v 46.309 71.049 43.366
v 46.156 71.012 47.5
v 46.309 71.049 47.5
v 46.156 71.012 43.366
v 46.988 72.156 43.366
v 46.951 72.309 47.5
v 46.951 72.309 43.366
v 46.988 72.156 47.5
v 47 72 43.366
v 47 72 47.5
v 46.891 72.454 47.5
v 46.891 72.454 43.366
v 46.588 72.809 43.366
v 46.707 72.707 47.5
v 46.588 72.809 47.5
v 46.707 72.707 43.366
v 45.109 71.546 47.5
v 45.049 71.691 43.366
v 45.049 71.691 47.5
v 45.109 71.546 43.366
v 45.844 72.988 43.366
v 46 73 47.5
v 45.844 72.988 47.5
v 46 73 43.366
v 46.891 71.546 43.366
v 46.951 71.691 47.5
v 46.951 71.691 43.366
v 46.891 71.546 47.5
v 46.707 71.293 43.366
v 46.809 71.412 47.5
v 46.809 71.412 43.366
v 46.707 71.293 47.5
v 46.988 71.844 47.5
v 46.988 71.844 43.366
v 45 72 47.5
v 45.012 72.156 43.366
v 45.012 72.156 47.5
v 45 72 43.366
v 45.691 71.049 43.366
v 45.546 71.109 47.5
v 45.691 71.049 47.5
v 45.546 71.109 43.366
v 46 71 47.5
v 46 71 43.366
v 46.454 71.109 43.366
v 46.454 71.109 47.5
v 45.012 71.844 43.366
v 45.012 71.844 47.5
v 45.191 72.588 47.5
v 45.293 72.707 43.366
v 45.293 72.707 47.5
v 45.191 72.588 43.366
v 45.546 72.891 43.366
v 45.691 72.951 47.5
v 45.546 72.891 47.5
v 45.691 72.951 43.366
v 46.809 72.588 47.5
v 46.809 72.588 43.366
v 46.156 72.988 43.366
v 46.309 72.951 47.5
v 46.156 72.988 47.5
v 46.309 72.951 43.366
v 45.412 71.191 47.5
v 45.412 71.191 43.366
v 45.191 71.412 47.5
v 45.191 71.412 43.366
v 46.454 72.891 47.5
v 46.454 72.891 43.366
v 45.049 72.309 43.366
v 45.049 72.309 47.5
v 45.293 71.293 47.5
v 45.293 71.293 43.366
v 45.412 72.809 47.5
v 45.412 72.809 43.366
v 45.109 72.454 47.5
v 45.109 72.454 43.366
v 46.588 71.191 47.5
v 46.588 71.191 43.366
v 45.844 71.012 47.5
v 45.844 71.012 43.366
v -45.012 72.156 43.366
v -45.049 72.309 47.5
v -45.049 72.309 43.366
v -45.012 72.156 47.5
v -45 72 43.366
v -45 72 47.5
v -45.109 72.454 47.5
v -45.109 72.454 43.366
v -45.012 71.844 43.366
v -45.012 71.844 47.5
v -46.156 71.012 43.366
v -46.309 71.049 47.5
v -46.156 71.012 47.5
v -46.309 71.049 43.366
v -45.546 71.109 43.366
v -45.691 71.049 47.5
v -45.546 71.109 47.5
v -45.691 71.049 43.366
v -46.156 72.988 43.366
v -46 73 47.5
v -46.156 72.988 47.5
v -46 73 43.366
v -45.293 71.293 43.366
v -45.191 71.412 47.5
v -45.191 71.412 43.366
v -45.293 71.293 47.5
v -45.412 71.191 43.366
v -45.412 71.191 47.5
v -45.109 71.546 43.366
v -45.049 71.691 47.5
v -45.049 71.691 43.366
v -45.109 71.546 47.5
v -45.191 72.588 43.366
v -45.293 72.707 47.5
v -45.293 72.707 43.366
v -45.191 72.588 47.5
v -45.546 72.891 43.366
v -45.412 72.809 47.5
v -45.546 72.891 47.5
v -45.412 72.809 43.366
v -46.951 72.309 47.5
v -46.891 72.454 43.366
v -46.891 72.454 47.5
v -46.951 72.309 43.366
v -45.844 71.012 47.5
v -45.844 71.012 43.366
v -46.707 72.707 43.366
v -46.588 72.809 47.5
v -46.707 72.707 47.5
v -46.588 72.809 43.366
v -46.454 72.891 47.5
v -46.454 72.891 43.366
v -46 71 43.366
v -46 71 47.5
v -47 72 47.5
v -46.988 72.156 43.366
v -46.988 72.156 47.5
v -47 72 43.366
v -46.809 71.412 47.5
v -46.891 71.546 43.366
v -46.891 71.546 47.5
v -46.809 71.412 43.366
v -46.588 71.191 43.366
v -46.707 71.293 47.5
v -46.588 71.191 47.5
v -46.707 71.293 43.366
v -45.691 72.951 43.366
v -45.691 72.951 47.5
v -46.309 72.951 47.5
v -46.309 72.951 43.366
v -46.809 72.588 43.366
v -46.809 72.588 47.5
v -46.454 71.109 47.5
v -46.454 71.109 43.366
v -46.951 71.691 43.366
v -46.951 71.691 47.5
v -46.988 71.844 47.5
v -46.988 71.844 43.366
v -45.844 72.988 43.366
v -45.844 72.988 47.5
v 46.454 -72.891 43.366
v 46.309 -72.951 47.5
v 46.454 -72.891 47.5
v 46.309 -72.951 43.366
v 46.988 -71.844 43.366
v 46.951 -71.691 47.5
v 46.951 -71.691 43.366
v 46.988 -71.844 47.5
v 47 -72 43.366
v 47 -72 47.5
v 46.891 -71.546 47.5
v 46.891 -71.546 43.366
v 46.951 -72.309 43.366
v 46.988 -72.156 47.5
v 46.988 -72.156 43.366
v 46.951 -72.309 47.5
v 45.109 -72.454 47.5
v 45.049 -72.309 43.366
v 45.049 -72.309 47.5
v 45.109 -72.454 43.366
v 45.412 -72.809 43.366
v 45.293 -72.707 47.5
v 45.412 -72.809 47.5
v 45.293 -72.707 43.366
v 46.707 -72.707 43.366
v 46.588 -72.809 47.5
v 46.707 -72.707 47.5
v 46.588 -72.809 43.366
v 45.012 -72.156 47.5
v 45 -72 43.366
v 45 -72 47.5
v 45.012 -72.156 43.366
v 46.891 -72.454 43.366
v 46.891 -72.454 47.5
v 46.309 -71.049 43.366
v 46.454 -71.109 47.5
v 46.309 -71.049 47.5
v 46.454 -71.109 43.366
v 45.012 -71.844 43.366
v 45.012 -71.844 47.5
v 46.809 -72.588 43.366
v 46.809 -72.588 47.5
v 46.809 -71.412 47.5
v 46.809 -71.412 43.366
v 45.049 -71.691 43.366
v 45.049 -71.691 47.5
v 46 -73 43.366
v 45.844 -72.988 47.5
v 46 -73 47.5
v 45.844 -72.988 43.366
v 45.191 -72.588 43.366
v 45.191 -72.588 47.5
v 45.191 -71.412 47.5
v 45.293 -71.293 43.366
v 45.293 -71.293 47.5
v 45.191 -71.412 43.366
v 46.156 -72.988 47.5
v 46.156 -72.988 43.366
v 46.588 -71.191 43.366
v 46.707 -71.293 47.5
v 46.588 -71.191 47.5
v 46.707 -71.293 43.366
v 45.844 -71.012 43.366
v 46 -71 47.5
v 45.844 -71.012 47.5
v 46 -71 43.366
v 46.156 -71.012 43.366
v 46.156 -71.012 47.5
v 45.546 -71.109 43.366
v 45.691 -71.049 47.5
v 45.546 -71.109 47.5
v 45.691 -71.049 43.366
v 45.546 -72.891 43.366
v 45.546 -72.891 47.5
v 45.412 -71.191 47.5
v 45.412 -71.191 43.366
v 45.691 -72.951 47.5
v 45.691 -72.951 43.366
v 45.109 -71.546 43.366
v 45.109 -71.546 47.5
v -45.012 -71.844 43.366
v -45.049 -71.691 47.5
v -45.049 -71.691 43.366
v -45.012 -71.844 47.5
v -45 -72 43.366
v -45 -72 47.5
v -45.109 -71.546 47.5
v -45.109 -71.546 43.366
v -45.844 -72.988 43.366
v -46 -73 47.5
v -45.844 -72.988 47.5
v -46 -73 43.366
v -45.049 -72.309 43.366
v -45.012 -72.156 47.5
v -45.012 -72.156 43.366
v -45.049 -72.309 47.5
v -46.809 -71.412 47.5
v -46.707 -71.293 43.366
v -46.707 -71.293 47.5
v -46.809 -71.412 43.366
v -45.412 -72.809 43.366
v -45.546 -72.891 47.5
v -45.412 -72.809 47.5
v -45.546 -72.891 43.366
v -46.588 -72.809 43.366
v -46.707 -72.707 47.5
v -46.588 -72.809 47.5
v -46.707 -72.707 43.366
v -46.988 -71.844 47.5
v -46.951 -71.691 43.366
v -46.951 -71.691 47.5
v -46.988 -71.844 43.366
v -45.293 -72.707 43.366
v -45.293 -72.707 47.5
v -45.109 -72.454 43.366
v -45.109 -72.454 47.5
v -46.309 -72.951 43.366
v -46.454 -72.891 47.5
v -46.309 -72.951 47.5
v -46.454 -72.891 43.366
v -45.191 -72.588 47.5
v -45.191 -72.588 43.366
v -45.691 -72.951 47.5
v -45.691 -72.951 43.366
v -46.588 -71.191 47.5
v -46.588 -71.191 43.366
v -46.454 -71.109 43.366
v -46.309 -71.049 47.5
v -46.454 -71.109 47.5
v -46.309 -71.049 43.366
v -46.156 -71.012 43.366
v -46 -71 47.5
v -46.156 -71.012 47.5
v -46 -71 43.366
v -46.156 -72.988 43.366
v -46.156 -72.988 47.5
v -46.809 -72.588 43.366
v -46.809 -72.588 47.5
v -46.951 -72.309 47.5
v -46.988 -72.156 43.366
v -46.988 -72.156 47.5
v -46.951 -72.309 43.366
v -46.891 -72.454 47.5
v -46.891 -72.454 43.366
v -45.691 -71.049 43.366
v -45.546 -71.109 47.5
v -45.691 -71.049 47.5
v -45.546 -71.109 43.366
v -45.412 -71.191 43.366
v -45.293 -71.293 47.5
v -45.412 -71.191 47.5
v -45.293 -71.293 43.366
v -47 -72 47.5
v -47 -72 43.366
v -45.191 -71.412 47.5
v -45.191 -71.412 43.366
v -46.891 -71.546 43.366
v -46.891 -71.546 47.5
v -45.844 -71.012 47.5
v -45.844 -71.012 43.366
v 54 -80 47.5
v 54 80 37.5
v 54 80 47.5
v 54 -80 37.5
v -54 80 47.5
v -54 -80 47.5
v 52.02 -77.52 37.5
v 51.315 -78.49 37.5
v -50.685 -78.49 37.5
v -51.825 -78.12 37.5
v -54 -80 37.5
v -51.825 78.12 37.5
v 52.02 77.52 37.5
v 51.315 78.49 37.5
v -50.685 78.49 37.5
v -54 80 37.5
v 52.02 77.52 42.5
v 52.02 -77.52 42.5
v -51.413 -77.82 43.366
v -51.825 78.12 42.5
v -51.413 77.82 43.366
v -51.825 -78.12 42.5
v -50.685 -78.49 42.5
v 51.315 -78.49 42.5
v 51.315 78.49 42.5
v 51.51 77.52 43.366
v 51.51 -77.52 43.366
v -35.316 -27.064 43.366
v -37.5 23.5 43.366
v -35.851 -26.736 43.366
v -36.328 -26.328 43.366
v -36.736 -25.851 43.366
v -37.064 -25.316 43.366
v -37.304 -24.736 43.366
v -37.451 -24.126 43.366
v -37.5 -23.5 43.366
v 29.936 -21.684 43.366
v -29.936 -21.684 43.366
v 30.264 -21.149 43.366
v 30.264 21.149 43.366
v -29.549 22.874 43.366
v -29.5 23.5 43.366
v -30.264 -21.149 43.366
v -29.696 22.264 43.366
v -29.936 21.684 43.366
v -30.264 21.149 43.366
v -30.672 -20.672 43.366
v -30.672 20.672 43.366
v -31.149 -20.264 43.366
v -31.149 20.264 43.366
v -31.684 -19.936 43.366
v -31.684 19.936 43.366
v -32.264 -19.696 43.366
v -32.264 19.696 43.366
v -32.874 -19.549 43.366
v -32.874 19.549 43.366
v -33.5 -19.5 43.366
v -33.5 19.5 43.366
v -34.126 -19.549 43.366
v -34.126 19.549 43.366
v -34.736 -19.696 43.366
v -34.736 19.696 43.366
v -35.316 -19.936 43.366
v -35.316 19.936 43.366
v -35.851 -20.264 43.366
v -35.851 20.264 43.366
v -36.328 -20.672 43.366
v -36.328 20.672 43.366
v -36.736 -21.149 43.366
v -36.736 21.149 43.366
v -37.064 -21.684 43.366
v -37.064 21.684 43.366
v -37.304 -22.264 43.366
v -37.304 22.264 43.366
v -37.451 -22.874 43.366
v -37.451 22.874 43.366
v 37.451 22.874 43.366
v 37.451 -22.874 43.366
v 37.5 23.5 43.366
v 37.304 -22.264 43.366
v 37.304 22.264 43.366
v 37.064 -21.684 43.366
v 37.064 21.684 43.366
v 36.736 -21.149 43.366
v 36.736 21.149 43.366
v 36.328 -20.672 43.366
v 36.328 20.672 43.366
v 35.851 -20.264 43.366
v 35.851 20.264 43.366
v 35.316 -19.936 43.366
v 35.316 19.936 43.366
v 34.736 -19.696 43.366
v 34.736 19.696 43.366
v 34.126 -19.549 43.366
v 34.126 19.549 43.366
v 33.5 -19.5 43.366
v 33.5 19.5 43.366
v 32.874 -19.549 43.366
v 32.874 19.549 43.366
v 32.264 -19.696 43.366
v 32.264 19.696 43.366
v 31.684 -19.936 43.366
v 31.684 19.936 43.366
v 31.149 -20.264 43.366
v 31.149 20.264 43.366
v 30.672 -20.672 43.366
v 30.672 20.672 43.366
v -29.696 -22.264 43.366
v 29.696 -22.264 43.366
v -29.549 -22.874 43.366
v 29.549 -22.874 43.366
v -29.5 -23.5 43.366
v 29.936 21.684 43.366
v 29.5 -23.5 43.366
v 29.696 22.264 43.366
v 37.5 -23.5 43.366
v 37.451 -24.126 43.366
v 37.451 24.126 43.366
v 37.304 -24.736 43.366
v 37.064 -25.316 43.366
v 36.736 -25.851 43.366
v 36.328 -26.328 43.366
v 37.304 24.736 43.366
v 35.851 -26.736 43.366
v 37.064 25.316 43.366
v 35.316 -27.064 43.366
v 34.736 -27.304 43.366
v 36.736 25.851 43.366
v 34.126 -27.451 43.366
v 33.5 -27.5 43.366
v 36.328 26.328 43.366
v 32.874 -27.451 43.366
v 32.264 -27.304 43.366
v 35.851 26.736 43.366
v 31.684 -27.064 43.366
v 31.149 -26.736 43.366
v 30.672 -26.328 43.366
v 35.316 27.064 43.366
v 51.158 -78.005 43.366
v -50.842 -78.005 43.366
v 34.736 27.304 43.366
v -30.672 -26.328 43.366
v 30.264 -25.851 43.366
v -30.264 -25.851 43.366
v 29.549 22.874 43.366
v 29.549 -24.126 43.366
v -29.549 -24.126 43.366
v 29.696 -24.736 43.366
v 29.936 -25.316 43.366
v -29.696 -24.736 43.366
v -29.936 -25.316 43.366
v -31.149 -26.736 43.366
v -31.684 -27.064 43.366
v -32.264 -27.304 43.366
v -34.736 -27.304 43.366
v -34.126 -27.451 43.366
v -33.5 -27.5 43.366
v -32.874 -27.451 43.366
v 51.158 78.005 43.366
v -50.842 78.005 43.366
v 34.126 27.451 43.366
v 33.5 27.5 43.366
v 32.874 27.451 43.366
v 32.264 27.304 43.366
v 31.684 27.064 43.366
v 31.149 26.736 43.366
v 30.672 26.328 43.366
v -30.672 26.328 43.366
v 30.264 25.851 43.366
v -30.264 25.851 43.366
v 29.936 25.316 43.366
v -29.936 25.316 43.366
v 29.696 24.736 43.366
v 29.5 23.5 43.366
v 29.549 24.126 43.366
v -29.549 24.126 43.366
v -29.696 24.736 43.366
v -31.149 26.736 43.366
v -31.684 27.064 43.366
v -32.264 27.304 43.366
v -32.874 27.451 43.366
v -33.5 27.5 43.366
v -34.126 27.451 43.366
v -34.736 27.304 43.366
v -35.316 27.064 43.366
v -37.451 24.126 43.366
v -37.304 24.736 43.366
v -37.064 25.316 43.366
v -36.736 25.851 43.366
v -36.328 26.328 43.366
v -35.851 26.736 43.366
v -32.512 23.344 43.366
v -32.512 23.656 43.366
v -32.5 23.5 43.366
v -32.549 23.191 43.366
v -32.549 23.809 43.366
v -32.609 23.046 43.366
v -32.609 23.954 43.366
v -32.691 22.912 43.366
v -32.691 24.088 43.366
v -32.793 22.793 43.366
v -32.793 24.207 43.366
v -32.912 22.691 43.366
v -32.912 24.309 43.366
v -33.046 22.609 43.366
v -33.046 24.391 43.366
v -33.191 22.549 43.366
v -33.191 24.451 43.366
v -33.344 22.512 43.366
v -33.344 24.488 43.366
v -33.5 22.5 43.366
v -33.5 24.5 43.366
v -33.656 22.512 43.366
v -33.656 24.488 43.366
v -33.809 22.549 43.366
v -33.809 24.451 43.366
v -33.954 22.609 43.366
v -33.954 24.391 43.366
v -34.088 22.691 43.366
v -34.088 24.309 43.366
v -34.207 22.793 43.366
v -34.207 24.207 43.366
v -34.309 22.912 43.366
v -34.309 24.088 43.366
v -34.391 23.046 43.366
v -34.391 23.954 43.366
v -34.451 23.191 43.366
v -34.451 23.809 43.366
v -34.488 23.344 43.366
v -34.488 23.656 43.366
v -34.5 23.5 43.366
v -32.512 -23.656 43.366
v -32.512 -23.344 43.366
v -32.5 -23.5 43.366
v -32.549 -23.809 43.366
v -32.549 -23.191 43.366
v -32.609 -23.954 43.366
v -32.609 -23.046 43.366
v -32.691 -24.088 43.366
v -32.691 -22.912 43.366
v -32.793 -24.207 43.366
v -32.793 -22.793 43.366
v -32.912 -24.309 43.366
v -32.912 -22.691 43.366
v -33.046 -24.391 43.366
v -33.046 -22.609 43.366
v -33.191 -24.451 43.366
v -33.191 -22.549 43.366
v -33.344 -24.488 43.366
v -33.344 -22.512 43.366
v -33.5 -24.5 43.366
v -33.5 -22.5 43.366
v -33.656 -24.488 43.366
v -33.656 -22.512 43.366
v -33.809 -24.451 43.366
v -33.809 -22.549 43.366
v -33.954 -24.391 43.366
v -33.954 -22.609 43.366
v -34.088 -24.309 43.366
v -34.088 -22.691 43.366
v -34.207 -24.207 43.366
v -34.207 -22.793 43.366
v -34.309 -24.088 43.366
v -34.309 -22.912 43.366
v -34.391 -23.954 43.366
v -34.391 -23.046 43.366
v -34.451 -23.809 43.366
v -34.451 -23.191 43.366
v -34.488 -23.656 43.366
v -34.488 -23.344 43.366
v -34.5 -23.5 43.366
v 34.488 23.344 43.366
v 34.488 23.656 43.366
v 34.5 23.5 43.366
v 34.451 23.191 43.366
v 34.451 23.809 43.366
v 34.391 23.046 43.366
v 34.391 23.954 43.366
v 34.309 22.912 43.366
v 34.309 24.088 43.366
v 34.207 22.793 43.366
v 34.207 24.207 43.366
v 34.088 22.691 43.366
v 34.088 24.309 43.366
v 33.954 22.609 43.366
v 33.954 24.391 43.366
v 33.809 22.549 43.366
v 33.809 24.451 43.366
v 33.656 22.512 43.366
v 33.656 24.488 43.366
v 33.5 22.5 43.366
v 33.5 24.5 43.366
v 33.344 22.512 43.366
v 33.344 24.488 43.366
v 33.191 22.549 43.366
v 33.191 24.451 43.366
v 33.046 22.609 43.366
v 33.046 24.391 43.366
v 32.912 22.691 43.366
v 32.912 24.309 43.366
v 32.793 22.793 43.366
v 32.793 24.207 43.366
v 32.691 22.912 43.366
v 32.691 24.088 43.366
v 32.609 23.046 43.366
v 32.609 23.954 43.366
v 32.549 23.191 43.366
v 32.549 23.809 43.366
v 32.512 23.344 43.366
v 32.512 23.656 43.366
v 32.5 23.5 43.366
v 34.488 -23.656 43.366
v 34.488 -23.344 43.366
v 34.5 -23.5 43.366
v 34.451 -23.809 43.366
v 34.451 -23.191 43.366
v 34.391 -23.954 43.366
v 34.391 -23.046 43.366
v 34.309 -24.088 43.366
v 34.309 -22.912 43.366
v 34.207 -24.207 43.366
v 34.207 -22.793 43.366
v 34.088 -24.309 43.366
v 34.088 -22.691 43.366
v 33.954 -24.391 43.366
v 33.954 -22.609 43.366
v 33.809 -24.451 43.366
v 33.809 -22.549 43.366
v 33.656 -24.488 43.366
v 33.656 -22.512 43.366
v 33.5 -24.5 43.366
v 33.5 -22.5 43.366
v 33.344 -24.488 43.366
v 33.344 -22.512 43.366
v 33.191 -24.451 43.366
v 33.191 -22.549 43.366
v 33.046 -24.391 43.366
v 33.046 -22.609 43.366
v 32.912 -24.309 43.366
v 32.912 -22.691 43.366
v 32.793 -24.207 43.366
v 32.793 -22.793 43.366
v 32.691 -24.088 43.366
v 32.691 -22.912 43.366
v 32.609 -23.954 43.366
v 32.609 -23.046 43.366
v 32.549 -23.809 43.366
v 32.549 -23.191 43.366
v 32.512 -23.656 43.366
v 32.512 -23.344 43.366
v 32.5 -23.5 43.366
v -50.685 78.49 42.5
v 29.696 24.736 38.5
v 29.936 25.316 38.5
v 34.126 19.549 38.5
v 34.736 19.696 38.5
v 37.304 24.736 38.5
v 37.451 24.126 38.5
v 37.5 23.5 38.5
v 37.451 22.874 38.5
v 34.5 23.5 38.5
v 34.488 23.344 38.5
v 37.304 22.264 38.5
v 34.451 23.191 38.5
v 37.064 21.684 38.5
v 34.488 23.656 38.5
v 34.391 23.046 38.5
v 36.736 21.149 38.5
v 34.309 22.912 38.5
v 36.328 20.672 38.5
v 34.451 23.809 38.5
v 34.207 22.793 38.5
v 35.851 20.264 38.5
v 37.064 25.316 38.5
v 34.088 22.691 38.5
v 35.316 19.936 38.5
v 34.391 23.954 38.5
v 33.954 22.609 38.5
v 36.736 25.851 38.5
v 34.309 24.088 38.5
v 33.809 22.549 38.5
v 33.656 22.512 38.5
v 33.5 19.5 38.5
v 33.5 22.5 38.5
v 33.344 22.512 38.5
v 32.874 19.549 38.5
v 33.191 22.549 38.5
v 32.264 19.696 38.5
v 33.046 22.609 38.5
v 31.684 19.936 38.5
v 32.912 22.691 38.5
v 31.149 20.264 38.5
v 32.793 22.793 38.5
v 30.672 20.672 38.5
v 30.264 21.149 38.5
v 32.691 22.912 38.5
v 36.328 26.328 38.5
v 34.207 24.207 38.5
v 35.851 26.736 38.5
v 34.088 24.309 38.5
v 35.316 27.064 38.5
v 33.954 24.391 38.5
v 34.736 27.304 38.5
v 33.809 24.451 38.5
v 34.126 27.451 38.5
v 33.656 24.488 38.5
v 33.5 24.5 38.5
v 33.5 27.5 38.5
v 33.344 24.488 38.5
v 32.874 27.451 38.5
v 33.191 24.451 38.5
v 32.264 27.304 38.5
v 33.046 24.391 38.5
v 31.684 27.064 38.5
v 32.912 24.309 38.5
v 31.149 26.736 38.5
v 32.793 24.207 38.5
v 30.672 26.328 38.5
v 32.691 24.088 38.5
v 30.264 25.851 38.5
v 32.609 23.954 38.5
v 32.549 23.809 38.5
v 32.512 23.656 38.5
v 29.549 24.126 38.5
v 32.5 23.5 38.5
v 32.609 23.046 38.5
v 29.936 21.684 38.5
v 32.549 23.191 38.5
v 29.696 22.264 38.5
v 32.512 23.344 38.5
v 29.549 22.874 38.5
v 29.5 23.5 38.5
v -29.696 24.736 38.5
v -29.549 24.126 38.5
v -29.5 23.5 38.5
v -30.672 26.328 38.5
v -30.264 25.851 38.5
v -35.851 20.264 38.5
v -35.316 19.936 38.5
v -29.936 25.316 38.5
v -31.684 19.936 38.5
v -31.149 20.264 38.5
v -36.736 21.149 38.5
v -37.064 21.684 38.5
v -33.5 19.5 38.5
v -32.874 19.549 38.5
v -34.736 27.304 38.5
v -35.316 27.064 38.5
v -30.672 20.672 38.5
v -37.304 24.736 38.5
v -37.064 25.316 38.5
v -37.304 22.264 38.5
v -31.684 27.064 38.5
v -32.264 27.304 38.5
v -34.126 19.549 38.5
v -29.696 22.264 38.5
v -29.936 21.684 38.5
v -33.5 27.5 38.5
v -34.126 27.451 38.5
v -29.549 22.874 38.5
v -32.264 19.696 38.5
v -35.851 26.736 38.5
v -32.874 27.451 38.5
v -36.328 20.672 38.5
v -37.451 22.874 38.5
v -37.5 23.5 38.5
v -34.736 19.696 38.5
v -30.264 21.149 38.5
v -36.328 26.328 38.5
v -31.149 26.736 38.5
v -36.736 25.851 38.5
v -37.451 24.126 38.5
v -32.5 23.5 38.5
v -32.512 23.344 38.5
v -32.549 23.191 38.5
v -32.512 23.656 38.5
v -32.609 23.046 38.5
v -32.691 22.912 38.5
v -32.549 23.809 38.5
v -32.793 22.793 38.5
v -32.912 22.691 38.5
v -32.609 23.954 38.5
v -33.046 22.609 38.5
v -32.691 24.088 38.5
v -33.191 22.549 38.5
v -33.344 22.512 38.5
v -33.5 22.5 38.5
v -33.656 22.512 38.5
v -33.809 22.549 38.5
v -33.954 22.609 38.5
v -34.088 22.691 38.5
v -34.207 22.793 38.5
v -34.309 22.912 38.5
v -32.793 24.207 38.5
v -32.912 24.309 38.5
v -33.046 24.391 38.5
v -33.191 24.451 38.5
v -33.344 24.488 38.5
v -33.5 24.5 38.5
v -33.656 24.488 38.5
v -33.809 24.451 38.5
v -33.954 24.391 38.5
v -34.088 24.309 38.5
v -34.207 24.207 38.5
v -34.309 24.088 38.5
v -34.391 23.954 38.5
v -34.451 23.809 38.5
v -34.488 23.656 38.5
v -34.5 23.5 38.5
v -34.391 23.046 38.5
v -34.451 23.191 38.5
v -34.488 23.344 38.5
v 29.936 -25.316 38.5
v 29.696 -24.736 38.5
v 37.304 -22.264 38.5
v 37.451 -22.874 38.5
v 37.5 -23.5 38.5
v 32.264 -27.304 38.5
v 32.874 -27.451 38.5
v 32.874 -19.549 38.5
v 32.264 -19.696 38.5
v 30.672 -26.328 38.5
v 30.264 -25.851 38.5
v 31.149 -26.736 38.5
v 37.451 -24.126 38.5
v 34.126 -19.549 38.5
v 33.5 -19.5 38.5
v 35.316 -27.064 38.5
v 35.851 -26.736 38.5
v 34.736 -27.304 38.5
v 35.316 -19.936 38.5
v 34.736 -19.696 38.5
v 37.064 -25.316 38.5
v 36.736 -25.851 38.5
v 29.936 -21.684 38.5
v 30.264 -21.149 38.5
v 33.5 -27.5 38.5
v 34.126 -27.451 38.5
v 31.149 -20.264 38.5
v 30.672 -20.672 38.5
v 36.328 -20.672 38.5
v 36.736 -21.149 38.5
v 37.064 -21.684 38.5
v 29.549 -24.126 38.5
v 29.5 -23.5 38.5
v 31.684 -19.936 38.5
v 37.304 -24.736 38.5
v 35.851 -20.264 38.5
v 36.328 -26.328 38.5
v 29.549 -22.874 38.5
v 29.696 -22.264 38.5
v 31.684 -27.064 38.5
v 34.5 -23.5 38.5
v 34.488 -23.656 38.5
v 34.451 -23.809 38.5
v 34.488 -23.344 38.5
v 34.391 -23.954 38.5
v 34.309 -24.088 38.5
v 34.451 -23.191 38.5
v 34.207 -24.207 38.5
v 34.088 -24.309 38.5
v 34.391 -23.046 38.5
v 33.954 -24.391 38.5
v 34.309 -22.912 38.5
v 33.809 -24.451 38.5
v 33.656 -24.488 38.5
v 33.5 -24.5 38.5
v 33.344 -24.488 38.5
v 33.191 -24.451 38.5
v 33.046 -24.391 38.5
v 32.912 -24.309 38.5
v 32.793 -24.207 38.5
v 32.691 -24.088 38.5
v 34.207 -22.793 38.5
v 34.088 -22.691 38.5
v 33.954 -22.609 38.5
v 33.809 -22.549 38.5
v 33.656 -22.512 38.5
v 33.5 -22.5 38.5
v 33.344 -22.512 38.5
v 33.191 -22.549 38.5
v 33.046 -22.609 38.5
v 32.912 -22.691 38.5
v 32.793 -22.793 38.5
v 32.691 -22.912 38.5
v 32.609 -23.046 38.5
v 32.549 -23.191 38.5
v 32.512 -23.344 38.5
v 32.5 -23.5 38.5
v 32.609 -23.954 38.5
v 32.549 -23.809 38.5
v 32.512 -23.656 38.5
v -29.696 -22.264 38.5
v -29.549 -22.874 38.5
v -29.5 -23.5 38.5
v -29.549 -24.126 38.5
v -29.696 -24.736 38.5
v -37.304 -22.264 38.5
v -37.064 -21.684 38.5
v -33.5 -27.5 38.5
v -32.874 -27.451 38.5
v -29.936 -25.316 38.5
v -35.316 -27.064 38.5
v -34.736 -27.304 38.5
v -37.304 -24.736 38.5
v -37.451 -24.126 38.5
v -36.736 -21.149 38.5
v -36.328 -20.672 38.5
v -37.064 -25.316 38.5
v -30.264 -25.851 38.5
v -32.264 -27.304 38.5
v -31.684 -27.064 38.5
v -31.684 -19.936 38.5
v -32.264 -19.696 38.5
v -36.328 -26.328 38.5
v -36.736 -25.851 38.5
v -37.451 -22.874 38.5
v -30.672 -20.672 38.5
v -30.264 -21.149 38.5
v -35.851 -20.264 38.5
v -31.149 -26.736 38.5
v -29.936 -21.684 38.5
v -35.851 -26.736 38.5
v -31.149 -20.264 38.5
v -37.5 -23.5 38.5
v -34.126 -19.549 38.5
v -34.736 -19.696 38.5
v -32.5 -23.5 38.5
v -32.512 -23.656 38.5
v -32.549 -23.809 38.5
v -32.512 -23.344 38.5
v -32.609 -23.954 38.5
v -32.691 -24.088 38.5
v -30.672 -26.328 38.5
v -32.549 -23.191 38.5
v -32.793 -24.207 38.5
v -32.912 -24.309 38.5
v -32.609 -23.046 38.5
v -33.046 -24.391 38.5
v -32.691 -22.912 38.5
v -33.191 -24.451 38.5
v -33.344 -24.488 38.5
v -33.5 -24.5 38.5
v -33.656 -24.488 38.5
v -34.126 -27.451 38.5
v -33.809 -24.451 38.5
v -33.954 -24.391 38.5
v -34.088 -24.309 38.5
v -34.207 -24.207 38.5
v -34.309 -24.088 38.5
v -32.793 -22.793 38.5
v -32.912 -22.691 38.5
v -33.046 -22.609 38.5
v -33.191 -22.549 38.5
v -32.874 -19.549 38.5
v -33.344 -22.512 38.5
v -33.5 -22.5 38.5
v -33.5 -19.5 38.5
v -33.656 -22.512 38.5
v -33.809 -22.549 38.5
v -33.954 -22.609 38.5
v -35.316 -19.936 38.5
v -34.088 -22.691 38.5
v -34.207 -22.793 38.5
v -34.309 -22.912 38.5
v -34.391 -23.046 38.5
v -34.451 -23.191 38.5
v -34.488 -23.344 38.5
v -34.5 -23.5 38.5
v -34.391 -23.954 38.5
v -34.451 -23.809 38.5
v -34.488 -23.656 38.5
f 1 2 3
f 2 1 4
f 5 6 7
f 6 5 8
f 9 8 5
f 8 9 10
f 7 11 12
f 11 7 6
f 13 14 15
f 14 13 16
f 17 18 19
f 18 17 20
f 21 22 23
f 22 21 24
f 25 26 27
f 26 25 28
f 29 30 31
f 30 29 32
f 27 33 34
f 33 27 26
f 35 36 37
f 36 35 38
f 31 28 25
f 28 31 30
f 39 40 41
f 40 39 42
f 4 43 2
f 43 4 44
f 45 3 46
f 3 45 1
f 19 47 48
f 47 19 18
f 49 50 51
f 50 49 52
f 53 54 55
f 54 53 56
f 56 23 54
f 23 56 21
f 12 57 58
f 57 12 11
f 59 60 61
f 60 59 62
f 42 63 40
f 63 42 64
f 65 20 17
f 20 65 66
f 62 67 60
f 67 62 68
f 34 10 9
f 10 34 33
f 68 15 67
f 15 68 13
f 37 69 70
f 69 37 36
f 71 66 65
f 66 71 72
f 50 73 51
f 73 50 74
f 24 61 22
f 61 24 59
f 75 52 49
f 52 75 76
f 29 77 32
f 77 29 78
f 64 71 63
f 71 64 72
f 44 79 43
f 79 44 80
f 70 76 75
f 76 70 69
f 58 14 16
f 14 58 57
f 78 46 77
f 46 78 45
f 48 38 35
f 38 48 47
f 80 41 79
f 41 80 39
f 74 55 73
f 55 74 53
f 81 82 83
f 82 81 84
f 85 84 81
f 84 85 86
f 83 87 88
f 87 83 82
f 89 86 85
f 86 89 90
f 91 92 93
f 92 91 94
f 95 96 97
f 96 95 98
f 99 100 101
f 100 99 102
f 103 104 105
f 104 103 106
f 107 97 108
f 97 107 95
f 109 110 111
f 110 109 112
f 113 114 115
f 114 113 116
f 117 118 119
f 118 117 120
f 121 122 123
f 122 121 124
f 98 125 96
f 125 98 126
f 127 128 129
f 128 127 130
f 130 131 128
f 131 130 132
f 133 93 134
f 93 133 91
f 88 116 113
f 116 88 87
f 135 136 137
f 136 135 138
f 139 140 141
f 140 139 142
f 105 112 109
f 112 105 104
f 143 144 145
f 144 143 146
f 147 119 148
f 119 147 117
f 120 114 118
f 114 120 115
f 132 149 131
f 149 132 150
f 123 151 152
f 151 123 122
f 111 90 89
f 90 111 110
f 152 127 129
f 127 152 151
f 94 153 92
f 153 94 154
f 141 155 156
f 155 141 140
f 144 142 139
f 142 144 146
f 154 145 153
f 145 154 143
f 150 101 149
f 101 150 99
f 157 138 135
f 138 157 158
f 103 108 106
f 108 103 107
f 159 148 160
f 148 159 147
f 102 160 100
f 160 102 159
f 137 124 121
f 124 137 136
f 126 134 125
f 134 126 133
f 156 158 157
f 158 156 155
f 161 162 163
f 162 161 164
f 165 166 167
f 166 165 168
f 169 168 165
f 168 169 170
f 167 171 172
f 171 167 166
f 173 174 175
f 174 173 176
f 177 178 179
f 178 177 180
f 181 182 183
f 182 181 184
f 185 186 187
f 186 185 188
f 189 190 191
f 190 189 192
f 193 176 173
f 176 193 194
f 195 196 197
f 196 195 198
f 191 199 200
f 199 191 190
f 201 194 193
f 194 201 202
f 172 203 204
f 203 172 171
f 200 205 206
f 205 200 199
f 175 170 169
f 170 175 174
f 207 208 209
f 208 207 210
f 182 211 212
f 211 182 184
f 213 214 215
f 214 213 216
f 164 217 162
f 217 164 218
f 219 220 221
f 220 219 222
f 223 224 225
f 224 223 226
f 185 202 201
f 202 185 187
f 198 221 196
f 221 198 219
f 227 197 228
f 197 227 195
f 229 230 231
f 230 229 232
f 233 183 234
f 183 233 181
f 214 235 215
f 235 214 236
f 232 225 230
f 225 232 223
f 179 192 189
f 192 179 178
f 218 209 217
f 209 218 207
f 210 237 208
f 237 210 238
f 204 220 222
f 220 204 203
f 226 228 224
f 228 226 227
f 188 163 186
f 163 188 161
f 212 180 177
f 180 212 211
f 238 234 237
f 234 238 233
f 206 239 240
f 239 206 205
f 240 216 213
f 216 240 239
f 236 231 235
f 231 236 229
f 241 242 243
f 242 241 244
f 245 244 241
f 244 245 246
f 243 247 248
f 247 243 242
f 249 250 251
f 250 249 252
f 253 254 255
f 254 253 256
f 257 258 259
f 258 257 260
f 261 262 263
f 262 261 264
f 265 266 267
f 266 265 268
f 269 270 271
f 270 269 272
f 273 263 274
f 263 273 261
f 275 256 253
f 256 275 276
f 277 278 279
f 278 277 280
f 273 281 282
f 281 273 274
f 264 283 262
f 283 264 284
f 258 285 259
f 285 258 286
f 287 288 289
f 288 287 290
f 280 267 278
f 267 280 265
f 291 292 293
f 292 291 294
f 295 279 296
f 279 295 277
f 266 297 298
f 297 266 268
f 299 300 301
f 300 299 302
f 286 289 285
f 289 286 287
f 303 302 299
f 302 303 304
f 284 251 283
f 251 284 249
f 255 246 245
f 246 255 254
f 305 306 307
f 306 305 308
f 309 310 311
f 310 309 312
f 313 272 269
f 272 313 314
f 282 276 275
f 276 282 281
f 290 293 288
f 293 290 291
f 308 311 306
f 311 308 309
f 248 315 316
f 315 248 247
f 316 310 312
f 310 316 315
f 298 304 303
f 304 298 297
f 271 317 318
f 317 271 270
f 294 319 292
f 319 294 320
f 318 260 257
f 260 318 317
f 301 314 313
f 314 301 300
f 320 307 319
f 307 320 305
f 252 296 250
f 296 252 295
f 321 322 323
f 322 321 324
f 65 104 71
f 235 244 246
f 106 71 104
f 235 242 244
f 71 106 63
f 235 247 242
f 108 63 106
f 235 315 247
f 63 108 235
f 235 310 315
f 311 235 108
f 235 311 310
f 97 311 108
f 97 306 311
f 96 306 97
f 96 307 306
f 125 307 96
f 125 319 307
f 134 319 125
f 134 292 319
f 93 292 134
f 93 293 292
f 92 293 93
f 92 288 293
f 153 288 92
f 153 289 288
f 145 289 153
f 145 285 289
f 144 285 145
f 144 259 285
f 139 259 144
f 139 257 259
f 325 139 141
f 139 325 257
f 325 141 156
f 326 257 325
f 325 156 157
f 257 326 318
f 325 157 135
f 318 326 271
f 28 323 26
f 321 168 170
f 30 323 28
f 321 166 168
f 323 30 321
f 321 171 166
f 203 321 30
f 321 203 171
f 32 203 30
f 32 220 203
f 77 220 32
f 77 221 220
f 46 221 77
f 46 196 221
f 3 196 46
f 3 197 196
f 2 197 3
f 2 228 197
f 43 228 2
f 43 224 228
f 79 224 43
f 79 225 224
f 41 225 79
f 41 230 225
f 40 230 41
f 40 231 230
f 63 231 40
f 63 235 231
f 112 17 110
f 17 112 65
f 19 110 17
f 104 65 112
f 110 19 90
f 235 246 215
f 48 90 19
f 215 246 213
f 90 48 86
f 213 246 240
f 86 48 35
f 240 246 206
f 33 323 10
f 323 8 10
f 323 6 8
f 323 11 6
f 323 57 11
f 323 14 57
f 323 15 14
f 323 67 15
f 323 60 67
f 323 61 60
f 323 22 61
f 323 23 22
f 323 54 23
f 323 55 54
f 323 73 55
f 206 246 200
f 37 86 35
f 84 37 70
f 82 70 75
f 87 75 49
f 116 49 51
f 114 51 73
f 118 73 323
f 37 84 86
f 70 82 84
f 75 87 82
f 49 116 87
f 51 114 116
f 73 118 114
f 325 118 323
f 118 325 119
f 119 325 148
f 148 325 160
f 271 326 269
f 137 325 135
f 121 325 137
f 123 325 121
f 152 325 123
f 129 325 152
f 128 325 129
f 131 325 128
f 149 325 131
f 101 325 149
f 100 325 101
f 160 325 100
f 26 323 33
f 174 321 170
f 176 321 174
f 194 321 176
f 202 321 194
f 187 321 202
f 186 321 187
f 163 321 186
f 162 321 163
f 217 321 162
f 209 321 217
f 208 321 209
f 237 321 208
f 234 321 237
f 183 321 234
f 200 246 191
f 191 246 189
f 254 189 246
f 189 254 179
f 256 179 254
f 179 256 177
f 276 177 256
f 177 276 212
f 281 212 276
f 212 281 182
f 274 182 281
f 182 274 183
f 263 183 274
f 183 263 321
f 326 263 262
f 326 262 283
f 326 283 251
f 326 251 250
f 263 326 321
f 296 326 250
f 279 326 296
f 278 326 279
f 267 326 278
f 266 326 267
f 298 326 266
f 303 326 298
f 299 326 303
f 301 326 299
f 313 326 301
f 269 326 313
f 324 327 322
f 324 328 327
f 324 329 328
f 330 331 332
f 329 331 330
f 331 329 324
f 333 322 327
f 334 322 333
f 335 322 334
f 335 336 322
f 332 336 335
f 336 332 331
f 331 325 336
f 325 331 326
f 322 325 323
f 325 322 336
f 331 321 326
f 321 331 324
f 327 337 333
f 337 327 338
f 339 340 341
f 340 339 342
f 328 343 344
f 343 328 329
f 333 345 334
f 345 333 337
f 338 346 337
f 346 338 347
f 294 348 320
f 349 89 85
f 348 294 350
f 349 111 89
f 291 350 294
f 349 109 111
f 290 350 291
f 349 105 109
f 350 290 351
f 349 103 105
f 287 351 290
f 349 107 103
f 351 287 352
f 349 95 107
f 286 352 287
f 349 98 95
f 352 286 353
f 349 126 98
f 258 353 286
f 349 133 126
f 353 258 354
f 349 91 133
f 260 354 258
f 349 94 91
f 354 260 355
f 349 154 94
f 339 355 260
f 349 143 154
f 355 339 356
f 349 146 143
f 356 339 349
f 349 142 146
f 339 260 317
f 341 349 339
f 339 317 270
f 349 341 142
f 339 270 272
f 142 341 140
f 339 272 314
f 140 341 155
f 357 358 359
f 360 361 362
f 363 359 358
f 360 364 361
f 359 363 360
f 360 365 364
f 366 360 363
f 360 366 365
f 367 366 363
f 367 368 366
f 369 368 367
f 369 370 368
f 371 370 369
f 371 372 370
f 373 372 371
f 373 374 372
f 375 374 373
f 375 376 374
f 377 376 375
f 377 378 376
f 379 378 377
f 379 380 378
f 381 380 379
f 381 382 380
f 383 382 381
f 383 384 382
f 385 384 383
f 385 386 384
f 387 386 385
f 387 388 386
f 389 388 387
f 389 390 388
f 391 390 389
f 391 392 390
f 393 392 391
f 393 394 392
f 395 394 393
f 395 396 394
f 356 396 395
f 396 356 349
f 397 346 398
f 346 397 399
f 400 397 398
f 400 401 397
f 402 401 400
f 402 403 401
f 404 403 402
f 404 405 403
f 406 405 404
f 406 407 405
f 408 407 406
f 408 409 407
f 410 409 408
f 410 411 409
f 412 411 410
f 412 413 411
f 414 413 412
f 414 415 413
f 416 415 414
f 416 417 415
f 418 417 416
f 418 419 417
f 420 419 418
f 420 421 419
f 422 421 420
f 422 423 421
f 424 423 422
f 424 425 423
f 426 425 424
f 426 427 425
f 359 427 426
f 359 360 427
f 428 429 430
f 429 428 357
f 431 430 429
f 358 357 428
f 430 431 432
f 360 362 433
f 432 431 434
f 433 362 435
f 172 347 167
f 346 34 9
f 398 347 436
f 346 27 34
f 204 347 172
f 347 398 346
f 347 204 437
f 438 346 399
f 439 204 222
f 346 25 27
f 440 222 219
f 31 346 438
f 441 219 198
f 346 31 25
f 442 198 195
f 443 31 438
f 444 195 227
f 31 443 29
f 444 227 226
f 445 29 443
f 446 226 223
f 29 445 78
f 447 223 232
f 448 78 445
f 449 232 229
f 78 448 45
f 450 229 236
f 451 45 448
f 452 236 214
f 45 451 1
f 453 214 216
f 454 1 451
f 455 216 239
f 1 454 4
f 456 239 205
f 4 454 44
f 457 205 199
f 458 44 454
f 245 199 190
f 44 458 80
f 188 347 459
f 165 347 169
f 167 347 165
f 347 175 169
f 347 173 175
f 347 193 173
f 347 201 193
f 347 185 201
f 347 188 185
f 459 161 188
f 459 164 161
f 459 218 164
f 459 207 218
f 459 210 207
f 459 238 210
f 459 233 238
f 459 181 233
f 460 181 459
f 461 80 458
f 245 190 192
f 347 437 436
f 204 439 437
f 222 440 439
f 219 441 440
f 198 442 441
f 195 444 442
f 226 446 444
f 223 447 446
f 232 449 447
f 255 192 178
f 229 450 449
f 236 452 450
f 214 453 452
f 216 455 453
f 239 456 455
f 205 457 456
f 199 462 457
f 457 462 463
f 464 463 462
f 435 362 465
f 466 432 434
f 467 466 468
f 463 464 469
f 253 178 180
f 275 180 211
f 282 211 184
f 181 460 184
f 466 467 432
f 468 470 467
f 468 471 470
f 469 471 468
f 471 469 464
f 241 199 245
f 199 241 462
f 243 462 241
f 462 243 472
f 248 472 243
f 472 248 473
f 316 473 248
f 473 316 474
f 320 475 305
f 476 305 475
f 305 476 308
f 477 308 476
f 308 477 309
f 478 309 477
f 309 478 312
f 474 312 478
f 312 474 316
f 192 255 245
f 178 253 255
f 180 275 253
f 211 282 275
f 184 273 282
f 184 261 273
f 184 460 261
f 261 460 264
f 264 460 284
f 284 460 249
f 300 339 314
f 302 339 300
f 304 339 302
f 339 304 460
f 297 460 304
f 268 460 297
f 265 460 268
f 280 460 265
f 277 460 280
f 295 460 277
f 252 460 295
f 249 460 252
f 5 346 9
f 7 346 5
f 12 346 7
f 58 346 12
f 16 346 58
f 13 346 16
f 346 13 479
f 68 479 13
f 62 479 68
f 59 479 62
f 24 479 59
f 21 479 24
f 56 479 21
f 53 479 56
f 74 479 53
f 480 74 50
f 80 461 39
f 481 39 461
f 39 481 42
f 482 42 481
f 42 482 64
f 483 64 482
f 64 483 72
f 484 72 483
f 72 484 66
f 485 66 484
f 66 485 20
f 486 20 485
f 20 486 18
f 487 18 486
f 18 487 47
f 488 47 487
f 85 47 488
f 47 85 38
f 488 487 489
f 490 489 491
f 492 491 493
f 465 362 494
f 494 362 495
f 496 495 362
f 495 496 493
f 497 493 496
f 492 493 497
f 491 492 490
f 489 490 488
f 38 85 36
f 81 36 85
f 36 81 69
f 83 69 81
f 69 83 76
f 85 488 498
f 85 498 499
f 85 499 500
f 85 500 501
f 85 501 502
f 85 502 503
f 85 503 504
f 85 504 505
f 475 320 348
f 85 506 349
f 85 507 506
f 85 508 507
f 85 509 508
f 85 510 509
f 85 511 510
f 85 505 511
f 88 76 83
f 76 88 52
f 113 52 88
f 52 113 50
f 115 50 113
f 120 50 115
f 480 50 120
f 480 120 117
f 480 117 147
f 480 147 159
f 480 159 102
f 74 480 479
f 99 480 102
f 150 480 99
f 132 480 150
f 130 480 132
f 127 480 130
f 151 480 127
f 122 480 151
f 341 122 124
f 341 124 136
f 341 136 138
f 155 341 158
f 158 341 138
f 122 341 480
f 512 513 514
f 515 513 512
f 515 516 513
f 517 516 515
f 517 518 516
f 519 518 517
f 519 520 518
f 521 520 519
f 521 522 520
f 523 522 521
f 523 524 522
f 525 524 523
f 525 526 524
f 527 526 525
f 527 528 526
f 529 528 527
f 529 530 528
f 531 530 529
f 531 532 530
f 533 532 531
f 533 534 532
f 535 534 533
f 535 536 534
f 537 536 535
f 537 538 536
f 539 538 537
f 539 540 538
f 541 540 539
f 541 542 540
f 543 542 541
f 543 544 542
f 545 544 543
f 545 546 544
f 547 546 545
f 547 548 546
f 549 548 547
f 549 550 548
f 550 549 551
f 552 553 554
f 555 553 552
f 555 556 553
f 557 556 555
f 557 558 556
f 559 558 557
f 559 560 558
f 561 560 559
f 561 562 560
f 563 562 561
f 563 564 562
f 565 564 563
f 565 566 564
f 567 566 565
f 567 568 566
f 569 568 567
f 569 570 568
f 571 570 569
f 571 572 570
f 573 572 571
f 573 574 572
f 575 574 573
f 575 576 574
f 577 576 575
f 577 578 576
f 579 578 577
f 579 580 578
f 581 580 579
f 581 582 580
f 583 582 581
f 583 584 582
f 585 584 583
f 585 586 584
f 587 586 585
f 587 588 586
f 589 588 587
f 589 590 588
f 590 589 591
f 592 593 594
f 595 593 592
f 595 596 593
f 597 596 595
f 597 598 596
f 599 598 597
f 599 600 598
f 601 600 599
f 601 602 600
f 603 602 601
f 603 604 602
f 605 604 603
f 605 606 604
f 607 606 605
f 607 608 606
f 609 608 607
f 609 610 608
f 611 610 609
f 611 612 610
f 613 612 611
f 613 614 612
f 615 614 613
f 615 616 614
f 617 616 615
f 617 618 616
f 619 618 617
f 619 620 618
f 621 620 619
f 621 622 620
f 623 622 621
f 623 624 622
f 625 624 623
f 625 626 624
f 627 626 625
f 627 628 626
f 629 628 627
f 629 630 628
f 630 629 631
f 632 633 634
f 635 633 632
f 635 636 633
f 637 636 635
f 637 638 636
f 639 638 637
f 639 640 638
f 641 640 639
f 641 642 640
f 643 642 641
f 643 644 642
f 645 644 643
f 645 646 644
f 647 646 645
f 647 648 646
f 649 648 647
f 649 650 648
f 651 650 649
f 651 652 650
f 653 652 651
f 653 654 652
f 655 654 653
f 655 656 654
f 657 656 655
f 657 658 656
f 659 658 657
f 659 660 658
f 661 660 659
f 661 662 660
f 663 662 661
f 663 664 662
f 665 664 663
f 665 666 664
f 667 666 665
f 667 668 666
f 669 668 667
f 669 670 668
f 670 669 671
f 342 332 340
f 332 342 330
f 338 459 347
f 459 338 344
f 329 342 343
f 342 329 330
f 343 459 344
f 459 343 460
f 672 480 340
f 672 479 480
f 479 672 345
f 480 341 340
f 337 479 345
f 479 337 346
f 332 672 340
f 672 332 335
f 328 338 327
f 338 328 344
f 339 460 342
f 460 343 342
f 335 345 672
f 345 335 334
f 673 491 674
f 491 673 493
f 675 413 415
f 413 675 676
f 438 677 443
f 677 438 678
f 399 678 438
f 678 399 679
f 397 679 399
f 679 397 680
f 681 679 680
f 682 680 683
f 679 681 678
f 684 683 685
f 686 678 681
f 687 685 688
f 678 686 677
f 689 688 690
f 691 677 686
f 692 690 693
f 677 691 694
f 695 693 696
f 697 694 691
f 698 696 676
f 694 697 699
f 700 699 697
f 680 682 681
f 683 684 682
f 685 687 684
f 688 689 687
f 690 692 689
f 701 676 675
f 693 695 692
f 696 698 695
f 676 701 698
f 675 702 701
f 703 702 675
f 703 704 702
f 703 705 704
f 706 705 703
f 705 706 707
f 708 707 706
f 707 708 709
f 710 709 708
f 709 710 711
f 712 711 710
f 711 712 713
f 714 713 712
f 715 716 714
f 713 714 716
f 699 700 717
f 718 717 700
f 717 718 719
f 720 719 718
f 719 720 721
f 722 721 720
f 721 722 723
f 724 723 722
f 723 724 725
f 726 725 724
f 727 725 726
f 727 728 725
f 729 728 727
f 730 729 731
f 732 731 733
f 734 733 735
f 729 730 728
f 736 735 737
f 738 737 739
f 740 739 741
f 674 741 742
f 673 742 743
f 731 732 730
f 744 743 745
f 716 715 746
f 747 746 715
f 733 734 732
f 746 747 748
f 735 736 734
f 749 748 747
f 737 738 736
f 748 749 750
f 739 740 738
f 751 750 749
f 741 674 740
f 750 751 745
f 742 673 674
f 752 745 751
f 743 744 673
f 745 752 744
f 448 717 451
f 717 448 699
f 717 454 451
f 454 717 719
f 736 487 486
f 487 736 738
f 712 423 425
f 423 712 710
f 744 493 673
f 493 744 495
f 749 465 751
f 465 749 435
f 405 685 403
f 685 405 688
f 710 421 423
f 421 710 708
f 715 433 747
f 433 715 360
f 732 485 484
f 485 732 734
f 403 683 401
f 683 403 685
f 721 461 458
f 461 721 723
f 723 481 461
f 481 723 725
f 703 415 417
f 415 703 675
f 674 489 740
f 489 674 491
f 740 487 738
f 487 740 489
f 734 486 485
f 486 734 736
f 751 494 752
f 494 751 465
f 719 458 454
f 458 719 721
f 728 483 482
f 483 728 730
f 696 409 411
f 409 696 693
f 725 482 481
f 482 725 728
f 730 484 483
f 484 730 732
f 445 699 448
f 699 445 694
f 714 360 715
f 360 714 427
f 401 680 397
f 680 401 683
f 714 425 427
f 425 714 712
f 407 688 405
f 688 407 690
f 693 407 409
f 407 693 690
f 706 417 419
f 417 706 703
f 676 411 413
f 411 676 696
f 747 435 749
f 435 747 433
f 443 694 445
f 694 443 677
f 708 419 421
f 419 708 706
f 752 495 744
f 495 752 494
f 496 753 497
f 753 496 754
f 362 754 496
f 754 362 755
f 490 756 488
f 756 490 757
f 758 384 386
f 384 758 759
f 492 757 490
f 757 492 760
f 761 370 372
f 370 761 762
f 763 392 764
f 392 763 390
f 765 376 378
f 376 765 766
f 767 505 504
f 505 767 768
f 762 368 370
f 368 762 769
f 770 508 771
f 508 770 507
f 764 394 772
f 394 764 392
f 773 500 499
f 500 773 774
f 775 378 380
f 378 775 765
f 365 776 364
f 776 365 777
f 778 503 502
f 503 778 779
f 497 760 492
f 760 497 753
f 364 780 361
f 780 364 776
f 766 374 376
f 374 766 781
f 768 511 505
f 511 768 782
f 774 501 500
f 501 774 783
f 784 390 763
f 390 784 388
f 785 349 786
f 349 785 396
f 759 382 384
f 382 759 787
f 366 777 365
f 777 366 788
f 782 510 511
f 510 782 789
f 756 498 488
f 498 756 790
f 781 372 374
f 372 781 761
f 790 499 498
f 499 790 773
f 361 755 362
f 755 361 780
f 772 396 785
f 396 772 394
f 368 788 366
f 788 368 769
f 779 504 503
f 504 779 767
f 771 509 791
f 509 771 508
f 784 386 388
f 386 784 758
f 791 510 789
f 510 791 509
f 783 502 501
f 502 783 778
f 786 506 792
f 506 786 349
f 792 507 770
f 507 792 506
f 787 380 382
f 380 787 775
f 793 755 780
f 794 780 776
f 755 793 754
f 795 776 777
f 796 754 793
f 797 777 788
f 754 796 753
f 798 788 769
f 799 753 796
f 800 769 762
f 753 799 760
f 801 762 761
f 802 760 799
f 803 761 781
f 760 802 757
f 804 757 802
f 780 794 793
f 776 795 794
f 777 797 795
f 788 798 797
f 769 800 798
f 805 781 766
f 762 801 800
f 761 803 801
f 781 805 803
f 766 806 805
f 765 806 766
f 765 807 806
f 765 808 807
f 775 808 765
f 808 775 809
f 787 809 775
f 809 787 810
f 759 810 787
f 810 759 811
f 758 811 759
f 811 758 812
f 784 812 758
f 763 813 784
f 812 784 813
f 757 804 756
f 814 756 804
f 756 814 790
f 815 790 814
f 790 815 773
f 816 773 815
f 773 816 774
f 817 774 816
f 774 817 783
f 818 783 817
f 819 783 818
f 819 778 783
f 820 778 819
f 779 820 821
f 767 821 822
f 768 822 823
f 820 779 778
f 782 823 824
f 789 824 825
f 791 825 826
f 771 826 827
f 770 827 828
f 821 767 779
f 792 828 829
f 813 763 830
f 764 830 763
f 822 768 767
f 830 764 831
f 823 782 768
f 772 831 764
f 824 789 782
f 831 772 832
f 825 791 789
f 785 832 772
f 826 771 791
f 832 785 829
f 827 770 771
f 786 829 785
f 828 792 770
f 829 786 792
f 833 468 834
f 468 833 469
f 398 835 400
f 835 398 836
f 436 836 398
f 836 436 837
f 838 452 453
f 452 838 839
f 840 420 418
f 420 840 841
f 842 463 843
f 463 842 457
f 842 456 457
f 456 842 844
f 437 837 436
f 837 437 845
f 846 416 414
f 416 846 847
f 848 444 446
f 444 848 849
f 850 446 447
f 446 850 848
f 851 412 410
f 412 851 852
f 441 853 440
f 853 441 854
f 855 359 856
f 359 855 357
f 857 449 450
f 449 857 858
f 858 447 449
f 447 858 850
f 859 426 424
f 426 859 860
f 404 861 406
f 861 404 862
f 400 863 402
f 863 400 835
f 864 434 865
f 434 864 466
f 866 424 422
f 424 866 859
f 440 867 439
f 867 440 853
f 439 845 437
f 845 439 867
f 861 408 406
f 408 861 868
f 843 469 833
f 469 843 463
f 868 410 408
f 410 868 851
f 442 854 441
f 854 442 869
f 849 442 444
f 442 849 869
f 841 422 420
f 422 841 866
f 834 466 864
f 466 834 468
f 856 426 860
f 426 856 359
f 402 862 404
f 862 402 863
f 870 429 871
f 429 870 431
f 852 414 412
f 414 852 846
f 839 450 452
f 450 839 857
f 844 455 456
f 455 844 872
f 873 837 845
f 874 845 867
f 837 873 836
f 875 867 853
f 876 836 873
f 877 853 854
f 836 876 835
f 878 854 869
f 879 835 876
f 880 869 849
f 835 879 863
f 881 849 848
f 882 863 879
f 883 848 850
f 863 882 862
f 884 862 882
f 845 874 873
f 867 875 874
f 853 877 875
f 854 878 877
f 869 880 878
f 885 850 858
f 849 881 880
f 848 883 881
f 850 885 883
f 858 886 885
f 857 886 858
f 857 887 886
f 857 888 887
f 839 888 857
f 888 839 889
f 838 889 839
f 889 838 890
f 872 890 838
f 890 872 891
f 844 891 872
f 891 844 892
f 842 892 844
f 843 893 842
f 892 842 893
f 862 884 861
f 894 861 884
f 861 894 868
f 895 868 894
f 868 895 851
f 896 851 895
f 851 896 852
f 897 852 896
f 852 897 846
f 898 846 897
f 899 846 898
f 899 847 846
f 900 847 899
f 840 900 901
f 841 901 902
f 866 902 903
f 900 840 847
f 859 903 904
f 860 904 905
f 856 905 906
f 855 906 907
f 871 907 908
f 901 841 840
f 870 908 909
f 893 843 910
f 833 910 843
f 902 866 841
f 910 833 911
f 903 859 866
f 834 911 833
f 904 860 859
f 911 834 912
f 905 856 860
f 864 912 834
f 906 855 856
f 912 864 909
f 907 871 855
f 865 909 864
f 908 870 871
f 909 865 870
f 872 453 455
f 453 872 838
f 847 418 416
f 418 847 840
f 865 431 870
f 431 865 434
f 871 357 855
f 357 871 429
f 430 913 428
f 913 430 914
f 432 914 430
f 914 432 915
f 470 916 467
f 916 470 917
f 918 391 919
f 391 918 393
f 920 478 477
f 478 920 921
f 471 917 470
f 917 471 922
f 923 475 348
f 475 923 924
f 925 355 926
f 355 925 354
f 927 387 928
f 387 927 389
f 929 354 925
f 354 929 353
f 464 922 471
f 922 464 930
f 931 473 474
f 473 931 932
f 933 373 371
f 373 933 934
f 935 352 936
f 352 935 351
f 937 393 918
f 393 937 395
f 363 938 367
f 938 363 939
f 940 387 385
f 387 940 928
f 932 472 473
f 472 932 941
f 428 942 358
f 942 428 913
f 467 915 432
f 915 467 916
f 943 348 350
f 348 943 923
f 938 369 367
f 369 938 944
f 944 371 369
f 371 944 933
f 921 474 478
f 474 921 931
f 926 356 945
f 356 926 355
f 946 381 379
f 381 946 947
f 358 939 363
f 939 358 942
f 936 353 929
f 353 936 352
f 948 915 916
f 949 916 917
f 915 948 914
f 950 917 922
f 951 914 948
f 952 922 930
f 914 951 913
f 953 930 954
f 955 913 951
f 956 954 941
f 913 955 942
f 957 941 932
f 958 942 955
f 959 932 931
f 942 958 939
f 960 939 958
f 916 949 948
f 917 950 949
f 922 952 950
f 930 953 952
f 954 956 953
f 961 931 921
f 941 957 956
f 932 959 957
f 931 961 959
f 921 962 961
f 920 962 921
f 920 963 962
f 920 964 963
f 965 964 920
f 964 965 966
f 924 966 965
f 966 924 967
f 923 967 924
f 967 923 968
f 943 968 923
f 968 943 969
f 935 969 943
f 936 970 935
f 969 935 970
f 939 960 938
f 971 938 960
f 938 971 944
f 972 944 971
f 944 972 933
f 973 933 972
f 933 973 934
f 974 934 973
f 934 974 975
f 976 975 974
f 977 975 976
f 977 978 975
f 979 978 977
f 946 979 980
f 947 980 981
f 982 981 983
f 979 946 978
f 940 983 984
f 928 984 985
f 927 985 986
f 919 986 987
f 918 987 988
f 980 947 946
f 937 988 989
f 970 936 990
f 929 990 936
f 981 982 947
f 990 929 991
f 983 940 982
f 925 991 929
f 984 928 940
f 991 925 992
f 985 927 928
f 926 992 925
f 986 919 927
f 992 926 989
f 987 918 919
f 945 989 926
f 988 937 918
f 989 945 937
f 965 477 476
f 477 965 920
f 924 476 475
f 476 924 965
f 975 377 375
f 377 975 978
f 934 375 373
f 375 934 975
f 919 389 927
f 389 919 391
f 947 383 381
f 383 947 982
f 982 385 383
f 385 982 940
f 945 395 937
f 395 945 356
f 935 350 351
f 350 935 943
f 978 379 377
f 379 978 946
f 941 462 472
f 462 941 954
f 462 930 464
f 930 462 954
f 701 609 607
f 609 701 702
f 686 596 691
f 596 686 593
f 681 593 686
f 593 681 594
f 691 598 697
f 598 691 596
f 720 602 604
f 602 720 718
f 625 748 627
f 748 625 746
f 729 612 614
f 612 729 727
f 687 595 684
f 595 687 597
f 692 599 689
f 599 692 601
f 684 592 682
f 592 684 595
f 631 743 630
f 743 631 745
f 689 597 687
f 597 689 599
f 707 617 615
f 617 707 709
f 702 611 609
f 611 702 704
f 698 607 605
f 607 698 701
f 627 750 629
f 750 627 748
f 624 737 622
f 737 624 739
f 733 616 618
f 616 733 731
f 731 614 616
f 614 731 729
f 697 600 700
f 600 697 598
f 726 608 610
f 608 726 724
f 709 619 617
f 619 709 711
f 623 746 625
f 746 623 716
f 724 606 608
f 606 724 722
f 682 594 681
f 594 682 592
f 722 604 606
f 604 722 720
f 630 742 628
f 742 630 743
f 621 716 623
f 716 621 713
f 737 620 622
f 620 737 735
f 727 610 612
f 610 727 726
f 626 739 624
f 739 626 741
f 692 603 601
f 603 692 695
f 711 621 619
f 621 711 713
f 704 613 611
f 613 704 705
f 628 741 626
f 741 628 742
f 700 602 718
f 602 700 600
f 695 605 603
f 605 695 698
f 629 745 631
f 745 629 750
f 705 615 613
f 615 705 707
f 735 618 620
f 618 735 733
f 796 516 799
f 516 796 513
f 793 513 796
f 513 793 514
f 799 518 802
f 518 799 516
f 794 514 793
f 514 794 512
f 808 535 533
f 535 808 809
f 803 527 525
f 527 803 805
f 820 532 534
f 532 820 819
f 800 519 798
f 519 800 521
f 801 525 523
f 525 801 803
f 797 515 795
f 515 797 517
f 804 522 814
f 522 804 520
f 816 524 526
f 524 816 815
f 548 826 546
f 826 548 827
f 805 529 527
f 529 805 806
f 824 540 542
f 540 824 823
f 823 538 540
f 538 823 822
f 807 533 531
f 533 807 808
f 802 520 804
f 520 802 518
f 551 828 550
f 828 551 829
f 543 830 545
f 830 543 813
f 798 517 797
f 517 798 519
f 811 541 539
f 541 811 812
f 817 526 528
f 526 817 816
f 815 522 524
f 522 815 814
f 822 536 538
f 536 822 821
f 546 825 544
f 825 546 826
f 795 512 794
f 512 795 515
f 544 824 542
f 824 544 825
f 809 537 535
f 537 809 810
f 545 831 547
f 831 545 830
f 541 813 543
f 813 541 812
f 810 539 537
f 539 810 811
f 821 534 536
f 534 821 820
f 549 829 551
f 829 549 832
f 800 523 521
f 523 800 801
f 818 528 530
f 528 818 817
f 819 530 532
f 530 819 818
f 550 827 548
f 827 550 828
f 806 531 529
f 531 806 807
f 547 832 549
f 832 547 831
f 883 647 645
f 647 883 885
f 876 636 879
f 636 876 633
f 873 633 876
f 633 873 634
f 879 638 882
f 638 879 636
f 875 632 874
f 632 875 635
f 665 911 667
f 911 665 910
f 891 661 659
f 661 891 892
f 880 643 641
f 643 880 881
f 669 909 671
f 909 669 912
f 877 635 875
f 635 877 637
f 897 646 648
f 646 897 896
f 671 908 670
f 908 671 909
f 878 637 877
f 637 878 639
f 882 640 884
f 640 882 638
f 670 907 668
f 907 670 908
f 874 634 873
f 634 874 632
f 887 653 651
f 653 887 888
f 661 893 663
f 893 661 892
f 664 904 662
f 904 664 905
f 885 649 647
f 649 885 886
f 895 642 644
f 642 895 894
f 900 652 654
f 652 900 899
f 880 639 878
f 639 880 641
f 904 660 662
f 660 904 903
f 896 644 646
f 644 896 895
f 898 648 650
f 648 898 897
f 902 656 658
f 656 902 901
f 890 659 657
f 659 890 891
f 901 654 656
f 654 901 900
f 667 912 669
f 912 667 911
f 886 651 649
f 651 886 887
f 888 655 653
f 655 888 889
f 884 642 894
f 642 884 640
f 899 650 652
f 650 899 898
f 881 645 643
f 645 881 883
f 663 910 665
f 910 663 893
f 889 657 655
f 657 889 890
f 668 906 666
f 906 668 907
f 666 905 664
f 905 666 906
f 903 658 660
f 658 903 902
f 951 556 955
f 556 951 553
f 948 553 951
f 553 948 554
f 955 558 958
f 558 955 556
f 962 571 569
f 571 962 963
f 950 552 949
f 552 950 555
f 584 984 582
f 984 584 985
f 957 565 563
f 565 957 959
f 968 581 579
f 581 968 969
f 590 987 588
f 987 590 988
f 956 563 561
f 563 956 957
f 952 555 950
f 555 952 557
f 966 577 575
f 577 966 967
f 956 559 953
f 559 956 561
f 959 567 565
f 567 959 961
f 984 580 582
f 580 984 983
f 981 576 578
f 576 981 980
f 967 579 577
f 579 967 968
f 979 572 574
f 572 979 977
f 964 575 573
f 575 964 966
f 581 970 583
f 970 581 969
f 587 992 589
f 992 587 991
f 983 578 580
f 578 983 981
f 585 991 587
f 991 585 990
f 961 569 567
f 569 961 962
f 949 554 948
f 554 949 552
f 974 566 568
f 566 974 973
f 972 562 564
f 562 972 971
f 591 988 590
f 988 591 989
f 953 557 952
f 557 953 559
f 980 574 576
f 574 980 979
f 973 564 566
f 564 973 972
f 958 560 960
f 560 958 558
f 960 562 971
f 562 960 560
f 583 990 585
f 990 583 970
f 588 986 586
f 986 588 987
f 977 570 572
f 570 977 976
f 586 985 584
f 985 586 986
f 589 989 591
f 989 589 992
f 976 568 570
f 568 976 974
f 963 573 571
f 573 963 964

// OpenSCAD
// 4 Kanal Schaltaktor mit Bateriebetrieb

// Platine
PX = 60;
PY = 72;
PZ = 25;

// Relaise
RX = 73;
RY = 53;
RZ = 25;

// Box
BX = PX + 40;
BY = PY + 80;
BZ = PZ + 40;

// Wandstärke
W = 2;

// ----------------------------

module Deckel() {
    translate([0,0,10])
    difference() {
        translate([0,0,BZ/2])
        cube([BX+4*W,BY+4*W, 10],center=true);
        scale([1.02,1.02,1]) Outer();
        translate([0,0,10])
        DeckelLocher();
    }
    translate([0,0,BZ+6])
    RelaiseHalterung();
}

module RelaiseSaulen() {
    R = 3;  // Abstand vom Rand
    translate([(RX/2-R),(RY/2-R),0])
    PCBSaule();
    translate([-(RX/2-R),(RY/2-R),0])
    PCBSaule();
    translate([(RX/2-R),-(RY/2-R),0])
    PCBSaule();
    translate([-(RX/2-R),-(RY/2-R),0])
    PCBSaule();
}

module RelaiseHalterung() {
    difference() {
        RelaiseSaulen();
        translate([0,0,-PZ])
        RelaiseLocher();
    }
}


module AnschlussHole() {
    translate([BX/2,0,BZ/2-20])
    rotate([0,90,0])
    cylinder(d=8,h=20,center=true,$fn=40);
}


module AnschlussHoles() {
    translate([0,-BY/2+30,0])
    AnschlussHole();
    translate([0,-BY/2+60,0])
    AnschlussHole();
    translate([0,BY/2-60,0])
    AnschlussHole();
    translate([0,BY/2-30,0])
    AnschlussHole();
    
    translate([-BX,0,-20])
    AnschlussHole();
    
    
}

module Deckelhalterung() {
    difference() {
        DeckelSaulen();
        translate([0,0,4])
        DeckelLocher();
    }
}

module DeckelSaule() {
    translate([0,0,0])
    cylinder(d=8,h=BZ-4,center=true,$fn=40);
}

module DeckelSaulen() {
    R = 4; // Abstand vom Rand
    translate([(BX/2-R),(BY/2-R),0])
    DeckelSaule();
    translate([-(BX/2-R),(BY/2-R),0])
    DeckelSaule();
    translate([(BX/2-R),-(BY/2-R),0])
    DeckelSaule();
    translate([-(BX/2-R),-(BY/2-R),0])
    DeckelSaule();
}
module DeckelLoch() {
    cylinder(d=2,h=BZ+4,center=true,$fn=40);
}

module DeckelLocher() {
    R = 4; // Abstand vom Rand
    translate([(BX/2-R),(BY/2-R),0])
    DeckelLoch();
    translate([-(BX/2-R),(BY/2-R),0])
    DeckelLoch();
    translate([(BX/2-R),-(BY/2-R),0])
    DeckelLoch();
    translate([-(BX/2-R),-(BY/2-R),0])
    DeckelLoch();
}

module PCBHalterung() {
    difference() {
        PCBSaulen();
        translate([0,0,-PZ])
        PCBLocher();
    }
}

module PCBSaule() {
    PCBHoehe=6;
    translate([0,0,-BZ/2+3])
    cylinder(d=8,h=PCBHoehe,center=true,$fn=40);
}

module PCBSaulen() {
    R = 3;  // Abstand vom Rand
    translate([(PX/2-R),(PY/2-R),0])
    PCBSaule();
    translate([-(PX/2-R),(PY/2-R),0])
    PCBSaule();
    translate([(PX/2-R),-(PY/2-R),0])
    PCBSaule();
    translate([-(PX/2-R),-(PY/2-R),0])
    PCBSaule();
}

module PCBLoch() {
    cylinder(d=2,h=PZ+4,center=true,$fn=40);
}

module PCBLocher() {
    R = 3;  // Abstand vom Rand
    translate([(PX/2-R),(PY/2-R),0])
    PCBLoch();
    translate([-(PX/2-R),(PY/2-R),0])
    PCBLoch();
    translate([(PX/2-R),-(PY/2-R),0])
    PCBLoch();
    translate([-(PX/2-R),-(PY/2-R),0])
    PCBLoch();
}

module HMPCB() {
    PCBHoehe=6;
    translate([0,0,-BZ/2+PZ/2+PCBHoehe])
    difference() {
        cube([PX,PY,PZ],center=true);
        PCBLocher();
    }
}

module RelaiseLocher() {
    R = 3;  // Abstand vom Rand
    translate([(RX/2-R),(RY/2-R),0])
    PCBLoch();
    translate([-(RX/2-R),(RY/2-R),0])
    PCBLoch();
    translate([(RX/2-R),-(RY/2-R),0])
    PCBLoch();
    translate([-(RX/2-R),-(RY/2-R),0])
    PCBLoch();
}


module Relaise() {
    PCBHoehe=6;
//    rotate([90,0,0])
//    translate([0,0,BY/2-RZ/2-PCBHoehe])
    difference() {
        cube([RX,RY,RZ],center=true);
        RelaiseLocher();
    }
}



module BLoch() {
    cylinder(d=3,h=BZ+4,center=true,$fn=40);
}

module Befestigungslocher() {
    R = 12;  // Abstand vom Rand
    translate([(BX/2-R),(BY/2-R),0])
    BLoch();
    translate([-(BX/2-R),(BY/2-R),0])
    BLoch();
    translate([(BX/2-R),-(BY/2-R),0])
    BLoch();
    translate([-(BX/2-R),-(BY/2-R),0])
    BLoch();
}


module Outer() {
    minkowski() {
        cube([BX,BY,BZ],center=true);
        sphere(r=1);
    }
}


module Inner() {
    translate([0,0,W])
    cube([BX-W,BY-W,BZ],center=true);
}


module Box() {
    difference() {
        Outer();
        Inner();
        Befestigungslocher();
        AnschlussHoles();
    }
    PCBHalterung();
    Deckelhalterung();
}



//Box();
//%HMPCB();
//%Relaise();
Deckel();
